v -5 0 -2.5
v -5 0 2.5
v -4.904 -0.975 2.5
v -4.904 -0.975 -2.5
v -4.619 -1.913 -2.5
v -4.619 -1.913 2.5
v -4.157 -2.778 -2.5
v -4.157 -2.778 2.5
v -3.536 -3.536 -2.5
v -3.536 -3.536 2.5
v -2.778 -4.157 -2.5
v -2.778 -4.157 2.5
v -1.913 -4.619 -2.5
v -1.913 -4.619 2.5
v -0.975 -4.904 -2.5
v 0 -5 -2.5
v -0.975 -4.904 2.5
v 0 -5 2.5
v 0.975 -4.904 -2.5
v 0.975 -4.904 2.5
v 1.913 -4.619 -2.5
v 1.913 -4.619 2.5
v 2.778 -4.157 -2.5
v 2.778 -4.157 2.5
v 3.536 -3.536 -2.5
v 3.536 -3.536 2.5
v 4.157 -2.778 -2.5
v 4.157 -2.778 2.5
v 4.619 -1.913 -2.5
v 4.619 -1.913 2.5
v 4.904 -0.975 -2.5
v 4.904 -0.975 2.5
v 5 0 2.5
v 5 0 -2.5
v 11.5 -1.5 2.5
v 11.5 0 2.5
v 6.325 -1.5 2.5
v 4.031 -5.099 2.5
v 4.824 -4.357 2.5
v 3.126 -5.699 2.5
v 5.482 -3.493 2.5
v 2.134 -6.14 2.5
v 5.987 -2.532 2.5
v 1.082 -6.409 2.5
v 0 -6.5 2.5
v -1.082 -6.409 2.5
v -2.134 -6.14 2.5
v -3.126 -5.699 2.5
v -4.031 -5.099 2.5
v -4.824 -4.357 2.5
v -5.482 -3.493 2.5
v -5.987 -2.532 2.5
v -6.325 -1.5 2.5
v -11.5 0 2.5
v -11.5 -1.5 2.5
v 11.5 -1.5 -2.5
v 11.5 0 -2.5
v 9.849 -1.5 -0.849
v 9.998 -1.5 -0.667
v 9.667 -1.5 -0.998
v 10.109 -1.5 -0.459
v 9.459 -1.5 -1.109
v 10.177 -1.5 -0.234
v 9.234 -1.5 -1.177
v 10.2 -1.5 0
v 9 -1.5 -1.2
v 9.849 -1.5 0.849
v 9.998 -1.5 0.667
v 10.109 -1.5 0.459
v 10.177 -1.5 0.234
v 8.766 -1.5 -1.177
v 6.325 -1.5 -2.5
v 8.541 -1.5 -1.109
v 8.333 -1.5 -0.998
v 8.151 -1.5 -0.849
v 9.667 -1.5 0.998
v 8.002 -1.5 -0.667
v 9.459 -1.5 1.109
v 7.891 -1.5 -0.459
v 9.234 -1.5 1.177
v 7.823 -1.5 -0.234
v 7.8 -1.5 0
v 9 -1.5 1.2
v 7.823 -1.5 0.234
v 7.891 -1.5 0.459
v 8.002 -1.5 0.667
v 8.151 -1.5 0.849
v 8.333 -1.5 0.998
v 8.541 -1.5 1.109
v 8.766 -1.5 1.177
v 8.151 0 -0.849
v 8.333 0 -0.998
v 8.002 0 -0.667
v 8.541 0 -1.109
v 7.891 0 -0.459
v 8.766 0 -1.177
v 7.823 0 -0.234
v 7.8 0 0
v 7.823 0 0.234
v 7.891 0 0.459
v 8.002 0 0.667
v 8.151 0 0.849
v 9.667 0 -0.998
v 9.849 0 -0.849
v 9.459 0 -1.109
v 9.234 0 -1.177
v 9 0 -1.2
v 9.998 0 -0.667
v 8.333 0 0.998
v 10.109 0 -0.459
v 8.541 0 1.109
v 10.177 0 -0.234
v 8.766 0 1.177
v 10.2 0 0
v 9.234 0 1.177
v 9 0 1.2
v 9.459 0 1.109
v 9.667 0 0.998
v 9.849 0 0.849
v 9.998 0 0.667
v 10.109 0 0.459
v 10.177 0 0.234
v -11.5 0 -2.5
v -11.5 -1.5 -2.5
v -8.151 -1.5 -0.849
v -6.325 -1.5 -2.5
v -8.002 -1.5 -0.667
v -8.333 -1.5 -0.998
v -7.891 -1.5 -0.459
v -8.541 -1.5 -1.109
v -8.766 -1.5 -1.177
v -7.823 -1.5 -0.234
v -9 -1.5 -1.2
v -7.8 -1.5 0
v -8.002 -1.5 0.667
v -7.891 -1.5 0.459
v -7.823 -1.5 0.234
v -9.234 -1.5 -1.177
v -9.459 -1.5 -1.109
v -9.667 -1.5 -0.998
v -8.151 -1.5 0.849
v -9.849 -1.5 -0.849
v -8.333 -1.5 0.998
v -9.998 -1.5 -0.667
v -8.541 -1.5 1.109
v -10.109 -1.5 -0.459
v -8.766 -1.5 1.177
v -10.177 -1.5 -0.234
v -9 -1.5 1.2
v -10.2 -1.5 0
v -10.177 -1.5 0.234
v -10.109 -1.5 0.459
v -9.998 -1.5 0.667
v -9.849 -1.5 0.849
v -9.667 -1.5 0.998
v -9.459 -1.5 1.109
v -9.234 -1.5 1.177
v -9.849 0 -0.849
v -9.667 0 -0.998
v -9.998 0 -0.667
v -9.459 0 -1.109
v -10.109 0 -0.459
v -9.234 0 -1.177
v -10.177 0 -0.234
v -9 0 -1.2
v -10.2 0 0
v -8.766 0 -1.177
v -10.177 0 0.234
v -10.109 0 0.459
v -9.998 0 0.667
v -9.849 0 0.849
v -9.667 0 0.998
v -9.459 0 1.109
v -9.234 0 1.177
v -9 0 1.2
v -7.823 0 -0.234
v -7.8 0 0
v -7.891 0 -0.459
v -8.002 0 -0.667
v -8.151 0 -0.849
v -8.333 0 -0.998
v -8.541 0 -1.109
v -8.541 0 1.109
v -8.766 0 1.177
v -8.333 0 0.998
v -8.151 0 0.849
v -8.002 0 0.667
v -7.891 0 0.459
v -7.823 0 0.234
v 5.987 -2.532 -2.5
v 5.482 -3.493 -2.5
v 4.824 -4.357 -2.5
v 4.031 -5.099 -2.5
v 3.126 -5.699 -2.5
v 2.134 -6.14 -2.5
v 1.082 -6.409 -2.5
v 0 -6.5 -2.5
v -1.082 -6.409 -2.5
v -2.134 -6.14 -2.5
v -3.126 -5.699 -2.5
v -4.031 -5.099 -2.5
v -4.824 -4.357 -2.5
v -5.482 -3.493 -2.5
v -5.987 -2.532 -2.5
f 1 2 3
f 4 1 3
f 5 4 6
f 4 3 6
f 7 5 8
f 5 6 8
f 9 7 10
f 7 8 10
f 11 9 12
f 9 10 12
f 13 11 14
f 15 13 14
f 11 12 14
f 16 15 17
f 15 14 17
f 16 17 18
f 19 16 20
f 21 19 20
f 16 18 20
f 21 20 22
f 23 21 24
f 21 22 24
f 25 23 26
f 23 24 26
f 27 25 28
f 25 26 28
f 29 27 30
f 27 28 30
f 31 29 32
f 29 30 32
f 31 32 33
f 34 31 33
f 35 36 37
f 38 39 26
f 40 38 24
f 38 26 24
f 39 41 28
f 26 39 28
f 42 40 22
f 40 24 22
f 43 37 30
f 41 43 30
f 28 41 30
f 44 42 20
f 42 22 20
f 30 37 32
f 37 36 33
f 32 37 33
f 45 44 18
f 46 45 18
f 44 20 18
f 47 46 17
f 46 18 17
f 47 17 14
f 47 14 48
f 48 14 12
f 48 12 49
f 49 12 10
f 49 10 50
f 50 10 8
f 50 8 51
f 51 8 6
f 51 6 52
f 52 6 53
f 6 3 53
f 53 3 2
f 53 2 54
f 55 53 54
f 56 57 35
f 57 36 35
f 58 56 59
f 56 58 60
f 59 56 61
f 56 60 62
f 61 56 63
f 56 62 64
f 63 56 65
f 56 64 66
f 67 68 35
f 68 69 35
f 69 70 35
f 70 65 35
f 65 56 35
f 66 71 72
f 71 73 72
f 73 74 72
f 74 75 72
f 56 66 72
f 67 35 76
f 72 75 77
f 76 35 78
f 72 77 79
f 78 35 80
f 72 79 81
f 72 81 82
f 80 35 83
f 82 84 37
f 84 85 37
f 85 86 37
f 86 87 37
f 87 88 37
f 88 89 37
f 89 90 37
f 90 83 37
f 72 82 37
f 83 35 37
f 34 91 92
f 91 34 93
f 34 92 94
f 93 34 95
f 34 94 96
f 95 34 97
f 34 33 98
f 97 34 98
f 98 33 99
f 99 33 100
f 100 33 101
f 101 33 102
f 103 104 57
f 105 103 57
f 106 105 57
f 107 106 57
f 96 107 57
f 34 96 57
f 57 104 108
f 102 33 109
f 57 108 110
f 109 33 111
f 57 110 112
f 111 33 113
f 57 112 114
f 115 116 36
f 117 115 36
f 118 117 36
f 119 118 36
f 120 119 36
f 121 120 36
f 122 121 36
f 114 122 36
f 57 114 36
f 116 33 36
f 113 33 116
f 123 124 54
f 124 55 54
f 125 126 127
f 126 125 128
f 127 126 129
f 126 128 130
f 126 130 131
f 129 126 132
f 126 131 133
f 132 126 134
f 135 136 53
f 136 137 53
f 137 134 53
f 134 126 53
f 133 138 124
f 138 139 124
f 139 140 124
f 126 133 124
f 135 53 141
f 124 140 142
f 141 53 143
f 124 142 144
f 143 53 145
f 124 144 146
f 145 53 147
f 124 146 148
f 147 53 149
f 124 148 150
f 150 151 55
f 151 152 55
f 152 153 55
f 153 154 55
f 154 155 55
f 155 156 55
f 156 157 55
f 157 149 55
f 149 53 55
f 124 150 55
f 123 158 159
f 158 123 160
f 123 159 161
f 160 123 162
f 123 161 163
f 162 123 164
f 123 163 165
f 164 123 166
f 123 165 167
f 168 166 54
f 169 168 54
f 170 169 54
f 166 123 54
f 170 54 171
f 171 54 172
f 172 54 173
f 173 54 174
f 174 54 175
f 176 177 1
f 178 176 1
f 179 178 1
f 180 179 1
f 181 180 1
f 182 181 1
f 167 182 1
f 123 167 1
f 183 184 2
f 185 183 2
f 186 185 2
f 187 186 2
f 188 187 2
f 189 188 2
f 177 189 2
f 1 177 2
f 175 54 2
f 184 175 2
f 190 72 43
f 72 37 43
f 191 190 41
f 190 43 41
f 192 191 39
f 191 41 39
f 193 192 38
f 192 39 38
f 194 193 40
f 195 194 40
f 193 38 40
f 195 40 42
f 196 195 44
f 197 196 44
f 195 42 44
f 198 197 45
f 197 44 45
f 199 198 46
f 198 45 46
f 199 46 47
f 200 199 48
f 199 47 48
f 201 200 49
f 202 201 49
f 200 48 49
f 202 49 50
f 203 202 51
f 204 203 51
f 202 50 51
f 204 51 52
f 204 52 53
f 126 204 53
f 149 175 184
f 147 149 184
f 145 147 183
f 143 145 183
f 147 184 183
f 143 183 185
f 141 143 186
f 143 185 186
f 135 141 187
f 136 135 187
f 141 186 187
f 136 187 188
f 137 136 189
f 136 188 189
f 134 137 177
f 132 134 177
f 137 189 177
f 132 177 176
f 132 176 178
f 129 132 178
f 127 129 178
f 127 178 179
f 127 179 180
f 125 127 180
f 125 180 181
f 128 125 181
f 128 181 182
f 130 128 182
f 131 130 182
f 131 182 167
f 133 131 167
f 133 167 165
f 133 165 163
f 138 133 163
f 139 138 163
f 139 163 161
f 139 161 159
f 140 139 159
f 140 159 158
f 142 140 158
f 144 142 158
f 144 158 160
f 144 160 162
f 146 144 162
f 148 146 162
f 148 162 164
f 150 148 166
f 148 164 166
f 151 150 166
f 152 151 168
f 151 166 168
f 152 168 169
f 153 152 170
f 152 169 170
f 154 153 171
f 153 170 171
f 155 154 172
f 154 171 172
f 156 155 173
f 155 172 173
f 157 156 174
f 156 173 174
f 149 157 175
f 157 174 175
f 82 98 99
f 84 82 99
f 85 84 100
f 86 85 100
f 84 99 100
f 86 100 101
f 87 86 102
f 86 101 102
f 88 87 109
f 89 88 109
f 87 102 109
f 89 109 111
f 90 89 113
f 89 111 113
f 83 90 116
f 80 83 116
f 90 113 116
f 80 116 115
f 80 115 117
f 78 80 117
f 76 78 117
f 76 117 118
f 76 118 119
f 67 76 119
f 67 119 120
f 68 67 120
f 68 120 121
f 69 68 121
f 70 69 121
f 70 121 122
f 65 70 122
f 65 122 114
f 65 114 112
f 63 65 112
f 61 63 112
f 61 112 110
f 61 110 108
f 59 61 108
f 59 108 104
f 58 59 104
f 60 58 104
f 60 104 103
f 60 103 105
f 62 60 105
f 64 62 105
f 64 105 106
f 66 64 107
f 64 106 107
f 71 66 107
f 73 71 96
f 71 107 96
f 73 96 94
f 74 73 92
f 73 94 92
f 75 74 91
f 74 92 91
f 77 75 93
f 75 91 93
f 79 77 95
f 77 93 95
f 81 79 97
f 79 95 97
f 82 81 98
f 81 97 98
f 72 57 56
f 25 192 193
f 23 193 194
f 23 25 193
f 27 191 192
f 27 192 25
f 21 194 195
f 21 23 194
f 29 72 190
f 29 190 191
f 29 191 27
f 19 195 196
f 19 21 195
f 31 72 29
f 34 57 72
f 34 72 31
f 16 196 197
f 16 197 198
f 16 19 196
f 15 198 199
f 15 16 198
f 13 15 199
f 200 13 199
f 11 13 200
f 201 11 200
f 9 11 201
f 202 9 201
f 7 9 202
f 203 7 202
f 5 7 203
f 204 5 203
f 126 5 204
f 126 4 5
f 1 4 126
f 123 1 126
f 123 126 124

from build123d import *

# Parameters (mm, degrees)
BOSS_EXTRUDE1_DEPTH = 2.5
SKETCH2_R           = 1.2
CUT_EXTRUDE1_DEPTH  = 14.44432966


with BuildPart() as part:
    # Sketch1 → Boss-Extrude1 (new, symmetric)
    with BuildSketch(Plane.XY):
        with BuildLine():
            Line((5, 0), (11.5, 0))
            Line((11.5, 0), (11.5, -1.5))
            Line((11.5, -1.5), (6.32455532, -1.5))
            ThreePointArc((6.32455532, -1.5), (0, -6.5), (-6.32455532, -1.5))
            Line((-6.32455532, -1.5), (-11.5, -1.5))
            Line((-11.5, -1.5), (-11.5, 0))
            Line((-11.5, 0), (-5, 0))
            ThreePointArc((-5, 0), (0, -5), (5, 0))
        make_face()
    extrude(amount=BOSS_EXTRUDE1_DEPTH, both=True)

    # Sketch2 → Cut-Extrude1 (cut, through all)
    with BuildSketch(Plane(origin=(0, 0, 0), x_dir=(1, 0, 0), z_dir=(0, 1, 0))):
        with Locations(Location((-9, 0, 0), (0, 0, 270))):
            Circle(SKETCH2_R)
        with Locations(Location((9, 0, 0), (0, 0, 180))):
            Circle(SKETCH2_R)
    extrude(amount=-CUT_EXTRUDE1_DEPTH, mode=Mode.SUBTRACT)


solid = part.part
